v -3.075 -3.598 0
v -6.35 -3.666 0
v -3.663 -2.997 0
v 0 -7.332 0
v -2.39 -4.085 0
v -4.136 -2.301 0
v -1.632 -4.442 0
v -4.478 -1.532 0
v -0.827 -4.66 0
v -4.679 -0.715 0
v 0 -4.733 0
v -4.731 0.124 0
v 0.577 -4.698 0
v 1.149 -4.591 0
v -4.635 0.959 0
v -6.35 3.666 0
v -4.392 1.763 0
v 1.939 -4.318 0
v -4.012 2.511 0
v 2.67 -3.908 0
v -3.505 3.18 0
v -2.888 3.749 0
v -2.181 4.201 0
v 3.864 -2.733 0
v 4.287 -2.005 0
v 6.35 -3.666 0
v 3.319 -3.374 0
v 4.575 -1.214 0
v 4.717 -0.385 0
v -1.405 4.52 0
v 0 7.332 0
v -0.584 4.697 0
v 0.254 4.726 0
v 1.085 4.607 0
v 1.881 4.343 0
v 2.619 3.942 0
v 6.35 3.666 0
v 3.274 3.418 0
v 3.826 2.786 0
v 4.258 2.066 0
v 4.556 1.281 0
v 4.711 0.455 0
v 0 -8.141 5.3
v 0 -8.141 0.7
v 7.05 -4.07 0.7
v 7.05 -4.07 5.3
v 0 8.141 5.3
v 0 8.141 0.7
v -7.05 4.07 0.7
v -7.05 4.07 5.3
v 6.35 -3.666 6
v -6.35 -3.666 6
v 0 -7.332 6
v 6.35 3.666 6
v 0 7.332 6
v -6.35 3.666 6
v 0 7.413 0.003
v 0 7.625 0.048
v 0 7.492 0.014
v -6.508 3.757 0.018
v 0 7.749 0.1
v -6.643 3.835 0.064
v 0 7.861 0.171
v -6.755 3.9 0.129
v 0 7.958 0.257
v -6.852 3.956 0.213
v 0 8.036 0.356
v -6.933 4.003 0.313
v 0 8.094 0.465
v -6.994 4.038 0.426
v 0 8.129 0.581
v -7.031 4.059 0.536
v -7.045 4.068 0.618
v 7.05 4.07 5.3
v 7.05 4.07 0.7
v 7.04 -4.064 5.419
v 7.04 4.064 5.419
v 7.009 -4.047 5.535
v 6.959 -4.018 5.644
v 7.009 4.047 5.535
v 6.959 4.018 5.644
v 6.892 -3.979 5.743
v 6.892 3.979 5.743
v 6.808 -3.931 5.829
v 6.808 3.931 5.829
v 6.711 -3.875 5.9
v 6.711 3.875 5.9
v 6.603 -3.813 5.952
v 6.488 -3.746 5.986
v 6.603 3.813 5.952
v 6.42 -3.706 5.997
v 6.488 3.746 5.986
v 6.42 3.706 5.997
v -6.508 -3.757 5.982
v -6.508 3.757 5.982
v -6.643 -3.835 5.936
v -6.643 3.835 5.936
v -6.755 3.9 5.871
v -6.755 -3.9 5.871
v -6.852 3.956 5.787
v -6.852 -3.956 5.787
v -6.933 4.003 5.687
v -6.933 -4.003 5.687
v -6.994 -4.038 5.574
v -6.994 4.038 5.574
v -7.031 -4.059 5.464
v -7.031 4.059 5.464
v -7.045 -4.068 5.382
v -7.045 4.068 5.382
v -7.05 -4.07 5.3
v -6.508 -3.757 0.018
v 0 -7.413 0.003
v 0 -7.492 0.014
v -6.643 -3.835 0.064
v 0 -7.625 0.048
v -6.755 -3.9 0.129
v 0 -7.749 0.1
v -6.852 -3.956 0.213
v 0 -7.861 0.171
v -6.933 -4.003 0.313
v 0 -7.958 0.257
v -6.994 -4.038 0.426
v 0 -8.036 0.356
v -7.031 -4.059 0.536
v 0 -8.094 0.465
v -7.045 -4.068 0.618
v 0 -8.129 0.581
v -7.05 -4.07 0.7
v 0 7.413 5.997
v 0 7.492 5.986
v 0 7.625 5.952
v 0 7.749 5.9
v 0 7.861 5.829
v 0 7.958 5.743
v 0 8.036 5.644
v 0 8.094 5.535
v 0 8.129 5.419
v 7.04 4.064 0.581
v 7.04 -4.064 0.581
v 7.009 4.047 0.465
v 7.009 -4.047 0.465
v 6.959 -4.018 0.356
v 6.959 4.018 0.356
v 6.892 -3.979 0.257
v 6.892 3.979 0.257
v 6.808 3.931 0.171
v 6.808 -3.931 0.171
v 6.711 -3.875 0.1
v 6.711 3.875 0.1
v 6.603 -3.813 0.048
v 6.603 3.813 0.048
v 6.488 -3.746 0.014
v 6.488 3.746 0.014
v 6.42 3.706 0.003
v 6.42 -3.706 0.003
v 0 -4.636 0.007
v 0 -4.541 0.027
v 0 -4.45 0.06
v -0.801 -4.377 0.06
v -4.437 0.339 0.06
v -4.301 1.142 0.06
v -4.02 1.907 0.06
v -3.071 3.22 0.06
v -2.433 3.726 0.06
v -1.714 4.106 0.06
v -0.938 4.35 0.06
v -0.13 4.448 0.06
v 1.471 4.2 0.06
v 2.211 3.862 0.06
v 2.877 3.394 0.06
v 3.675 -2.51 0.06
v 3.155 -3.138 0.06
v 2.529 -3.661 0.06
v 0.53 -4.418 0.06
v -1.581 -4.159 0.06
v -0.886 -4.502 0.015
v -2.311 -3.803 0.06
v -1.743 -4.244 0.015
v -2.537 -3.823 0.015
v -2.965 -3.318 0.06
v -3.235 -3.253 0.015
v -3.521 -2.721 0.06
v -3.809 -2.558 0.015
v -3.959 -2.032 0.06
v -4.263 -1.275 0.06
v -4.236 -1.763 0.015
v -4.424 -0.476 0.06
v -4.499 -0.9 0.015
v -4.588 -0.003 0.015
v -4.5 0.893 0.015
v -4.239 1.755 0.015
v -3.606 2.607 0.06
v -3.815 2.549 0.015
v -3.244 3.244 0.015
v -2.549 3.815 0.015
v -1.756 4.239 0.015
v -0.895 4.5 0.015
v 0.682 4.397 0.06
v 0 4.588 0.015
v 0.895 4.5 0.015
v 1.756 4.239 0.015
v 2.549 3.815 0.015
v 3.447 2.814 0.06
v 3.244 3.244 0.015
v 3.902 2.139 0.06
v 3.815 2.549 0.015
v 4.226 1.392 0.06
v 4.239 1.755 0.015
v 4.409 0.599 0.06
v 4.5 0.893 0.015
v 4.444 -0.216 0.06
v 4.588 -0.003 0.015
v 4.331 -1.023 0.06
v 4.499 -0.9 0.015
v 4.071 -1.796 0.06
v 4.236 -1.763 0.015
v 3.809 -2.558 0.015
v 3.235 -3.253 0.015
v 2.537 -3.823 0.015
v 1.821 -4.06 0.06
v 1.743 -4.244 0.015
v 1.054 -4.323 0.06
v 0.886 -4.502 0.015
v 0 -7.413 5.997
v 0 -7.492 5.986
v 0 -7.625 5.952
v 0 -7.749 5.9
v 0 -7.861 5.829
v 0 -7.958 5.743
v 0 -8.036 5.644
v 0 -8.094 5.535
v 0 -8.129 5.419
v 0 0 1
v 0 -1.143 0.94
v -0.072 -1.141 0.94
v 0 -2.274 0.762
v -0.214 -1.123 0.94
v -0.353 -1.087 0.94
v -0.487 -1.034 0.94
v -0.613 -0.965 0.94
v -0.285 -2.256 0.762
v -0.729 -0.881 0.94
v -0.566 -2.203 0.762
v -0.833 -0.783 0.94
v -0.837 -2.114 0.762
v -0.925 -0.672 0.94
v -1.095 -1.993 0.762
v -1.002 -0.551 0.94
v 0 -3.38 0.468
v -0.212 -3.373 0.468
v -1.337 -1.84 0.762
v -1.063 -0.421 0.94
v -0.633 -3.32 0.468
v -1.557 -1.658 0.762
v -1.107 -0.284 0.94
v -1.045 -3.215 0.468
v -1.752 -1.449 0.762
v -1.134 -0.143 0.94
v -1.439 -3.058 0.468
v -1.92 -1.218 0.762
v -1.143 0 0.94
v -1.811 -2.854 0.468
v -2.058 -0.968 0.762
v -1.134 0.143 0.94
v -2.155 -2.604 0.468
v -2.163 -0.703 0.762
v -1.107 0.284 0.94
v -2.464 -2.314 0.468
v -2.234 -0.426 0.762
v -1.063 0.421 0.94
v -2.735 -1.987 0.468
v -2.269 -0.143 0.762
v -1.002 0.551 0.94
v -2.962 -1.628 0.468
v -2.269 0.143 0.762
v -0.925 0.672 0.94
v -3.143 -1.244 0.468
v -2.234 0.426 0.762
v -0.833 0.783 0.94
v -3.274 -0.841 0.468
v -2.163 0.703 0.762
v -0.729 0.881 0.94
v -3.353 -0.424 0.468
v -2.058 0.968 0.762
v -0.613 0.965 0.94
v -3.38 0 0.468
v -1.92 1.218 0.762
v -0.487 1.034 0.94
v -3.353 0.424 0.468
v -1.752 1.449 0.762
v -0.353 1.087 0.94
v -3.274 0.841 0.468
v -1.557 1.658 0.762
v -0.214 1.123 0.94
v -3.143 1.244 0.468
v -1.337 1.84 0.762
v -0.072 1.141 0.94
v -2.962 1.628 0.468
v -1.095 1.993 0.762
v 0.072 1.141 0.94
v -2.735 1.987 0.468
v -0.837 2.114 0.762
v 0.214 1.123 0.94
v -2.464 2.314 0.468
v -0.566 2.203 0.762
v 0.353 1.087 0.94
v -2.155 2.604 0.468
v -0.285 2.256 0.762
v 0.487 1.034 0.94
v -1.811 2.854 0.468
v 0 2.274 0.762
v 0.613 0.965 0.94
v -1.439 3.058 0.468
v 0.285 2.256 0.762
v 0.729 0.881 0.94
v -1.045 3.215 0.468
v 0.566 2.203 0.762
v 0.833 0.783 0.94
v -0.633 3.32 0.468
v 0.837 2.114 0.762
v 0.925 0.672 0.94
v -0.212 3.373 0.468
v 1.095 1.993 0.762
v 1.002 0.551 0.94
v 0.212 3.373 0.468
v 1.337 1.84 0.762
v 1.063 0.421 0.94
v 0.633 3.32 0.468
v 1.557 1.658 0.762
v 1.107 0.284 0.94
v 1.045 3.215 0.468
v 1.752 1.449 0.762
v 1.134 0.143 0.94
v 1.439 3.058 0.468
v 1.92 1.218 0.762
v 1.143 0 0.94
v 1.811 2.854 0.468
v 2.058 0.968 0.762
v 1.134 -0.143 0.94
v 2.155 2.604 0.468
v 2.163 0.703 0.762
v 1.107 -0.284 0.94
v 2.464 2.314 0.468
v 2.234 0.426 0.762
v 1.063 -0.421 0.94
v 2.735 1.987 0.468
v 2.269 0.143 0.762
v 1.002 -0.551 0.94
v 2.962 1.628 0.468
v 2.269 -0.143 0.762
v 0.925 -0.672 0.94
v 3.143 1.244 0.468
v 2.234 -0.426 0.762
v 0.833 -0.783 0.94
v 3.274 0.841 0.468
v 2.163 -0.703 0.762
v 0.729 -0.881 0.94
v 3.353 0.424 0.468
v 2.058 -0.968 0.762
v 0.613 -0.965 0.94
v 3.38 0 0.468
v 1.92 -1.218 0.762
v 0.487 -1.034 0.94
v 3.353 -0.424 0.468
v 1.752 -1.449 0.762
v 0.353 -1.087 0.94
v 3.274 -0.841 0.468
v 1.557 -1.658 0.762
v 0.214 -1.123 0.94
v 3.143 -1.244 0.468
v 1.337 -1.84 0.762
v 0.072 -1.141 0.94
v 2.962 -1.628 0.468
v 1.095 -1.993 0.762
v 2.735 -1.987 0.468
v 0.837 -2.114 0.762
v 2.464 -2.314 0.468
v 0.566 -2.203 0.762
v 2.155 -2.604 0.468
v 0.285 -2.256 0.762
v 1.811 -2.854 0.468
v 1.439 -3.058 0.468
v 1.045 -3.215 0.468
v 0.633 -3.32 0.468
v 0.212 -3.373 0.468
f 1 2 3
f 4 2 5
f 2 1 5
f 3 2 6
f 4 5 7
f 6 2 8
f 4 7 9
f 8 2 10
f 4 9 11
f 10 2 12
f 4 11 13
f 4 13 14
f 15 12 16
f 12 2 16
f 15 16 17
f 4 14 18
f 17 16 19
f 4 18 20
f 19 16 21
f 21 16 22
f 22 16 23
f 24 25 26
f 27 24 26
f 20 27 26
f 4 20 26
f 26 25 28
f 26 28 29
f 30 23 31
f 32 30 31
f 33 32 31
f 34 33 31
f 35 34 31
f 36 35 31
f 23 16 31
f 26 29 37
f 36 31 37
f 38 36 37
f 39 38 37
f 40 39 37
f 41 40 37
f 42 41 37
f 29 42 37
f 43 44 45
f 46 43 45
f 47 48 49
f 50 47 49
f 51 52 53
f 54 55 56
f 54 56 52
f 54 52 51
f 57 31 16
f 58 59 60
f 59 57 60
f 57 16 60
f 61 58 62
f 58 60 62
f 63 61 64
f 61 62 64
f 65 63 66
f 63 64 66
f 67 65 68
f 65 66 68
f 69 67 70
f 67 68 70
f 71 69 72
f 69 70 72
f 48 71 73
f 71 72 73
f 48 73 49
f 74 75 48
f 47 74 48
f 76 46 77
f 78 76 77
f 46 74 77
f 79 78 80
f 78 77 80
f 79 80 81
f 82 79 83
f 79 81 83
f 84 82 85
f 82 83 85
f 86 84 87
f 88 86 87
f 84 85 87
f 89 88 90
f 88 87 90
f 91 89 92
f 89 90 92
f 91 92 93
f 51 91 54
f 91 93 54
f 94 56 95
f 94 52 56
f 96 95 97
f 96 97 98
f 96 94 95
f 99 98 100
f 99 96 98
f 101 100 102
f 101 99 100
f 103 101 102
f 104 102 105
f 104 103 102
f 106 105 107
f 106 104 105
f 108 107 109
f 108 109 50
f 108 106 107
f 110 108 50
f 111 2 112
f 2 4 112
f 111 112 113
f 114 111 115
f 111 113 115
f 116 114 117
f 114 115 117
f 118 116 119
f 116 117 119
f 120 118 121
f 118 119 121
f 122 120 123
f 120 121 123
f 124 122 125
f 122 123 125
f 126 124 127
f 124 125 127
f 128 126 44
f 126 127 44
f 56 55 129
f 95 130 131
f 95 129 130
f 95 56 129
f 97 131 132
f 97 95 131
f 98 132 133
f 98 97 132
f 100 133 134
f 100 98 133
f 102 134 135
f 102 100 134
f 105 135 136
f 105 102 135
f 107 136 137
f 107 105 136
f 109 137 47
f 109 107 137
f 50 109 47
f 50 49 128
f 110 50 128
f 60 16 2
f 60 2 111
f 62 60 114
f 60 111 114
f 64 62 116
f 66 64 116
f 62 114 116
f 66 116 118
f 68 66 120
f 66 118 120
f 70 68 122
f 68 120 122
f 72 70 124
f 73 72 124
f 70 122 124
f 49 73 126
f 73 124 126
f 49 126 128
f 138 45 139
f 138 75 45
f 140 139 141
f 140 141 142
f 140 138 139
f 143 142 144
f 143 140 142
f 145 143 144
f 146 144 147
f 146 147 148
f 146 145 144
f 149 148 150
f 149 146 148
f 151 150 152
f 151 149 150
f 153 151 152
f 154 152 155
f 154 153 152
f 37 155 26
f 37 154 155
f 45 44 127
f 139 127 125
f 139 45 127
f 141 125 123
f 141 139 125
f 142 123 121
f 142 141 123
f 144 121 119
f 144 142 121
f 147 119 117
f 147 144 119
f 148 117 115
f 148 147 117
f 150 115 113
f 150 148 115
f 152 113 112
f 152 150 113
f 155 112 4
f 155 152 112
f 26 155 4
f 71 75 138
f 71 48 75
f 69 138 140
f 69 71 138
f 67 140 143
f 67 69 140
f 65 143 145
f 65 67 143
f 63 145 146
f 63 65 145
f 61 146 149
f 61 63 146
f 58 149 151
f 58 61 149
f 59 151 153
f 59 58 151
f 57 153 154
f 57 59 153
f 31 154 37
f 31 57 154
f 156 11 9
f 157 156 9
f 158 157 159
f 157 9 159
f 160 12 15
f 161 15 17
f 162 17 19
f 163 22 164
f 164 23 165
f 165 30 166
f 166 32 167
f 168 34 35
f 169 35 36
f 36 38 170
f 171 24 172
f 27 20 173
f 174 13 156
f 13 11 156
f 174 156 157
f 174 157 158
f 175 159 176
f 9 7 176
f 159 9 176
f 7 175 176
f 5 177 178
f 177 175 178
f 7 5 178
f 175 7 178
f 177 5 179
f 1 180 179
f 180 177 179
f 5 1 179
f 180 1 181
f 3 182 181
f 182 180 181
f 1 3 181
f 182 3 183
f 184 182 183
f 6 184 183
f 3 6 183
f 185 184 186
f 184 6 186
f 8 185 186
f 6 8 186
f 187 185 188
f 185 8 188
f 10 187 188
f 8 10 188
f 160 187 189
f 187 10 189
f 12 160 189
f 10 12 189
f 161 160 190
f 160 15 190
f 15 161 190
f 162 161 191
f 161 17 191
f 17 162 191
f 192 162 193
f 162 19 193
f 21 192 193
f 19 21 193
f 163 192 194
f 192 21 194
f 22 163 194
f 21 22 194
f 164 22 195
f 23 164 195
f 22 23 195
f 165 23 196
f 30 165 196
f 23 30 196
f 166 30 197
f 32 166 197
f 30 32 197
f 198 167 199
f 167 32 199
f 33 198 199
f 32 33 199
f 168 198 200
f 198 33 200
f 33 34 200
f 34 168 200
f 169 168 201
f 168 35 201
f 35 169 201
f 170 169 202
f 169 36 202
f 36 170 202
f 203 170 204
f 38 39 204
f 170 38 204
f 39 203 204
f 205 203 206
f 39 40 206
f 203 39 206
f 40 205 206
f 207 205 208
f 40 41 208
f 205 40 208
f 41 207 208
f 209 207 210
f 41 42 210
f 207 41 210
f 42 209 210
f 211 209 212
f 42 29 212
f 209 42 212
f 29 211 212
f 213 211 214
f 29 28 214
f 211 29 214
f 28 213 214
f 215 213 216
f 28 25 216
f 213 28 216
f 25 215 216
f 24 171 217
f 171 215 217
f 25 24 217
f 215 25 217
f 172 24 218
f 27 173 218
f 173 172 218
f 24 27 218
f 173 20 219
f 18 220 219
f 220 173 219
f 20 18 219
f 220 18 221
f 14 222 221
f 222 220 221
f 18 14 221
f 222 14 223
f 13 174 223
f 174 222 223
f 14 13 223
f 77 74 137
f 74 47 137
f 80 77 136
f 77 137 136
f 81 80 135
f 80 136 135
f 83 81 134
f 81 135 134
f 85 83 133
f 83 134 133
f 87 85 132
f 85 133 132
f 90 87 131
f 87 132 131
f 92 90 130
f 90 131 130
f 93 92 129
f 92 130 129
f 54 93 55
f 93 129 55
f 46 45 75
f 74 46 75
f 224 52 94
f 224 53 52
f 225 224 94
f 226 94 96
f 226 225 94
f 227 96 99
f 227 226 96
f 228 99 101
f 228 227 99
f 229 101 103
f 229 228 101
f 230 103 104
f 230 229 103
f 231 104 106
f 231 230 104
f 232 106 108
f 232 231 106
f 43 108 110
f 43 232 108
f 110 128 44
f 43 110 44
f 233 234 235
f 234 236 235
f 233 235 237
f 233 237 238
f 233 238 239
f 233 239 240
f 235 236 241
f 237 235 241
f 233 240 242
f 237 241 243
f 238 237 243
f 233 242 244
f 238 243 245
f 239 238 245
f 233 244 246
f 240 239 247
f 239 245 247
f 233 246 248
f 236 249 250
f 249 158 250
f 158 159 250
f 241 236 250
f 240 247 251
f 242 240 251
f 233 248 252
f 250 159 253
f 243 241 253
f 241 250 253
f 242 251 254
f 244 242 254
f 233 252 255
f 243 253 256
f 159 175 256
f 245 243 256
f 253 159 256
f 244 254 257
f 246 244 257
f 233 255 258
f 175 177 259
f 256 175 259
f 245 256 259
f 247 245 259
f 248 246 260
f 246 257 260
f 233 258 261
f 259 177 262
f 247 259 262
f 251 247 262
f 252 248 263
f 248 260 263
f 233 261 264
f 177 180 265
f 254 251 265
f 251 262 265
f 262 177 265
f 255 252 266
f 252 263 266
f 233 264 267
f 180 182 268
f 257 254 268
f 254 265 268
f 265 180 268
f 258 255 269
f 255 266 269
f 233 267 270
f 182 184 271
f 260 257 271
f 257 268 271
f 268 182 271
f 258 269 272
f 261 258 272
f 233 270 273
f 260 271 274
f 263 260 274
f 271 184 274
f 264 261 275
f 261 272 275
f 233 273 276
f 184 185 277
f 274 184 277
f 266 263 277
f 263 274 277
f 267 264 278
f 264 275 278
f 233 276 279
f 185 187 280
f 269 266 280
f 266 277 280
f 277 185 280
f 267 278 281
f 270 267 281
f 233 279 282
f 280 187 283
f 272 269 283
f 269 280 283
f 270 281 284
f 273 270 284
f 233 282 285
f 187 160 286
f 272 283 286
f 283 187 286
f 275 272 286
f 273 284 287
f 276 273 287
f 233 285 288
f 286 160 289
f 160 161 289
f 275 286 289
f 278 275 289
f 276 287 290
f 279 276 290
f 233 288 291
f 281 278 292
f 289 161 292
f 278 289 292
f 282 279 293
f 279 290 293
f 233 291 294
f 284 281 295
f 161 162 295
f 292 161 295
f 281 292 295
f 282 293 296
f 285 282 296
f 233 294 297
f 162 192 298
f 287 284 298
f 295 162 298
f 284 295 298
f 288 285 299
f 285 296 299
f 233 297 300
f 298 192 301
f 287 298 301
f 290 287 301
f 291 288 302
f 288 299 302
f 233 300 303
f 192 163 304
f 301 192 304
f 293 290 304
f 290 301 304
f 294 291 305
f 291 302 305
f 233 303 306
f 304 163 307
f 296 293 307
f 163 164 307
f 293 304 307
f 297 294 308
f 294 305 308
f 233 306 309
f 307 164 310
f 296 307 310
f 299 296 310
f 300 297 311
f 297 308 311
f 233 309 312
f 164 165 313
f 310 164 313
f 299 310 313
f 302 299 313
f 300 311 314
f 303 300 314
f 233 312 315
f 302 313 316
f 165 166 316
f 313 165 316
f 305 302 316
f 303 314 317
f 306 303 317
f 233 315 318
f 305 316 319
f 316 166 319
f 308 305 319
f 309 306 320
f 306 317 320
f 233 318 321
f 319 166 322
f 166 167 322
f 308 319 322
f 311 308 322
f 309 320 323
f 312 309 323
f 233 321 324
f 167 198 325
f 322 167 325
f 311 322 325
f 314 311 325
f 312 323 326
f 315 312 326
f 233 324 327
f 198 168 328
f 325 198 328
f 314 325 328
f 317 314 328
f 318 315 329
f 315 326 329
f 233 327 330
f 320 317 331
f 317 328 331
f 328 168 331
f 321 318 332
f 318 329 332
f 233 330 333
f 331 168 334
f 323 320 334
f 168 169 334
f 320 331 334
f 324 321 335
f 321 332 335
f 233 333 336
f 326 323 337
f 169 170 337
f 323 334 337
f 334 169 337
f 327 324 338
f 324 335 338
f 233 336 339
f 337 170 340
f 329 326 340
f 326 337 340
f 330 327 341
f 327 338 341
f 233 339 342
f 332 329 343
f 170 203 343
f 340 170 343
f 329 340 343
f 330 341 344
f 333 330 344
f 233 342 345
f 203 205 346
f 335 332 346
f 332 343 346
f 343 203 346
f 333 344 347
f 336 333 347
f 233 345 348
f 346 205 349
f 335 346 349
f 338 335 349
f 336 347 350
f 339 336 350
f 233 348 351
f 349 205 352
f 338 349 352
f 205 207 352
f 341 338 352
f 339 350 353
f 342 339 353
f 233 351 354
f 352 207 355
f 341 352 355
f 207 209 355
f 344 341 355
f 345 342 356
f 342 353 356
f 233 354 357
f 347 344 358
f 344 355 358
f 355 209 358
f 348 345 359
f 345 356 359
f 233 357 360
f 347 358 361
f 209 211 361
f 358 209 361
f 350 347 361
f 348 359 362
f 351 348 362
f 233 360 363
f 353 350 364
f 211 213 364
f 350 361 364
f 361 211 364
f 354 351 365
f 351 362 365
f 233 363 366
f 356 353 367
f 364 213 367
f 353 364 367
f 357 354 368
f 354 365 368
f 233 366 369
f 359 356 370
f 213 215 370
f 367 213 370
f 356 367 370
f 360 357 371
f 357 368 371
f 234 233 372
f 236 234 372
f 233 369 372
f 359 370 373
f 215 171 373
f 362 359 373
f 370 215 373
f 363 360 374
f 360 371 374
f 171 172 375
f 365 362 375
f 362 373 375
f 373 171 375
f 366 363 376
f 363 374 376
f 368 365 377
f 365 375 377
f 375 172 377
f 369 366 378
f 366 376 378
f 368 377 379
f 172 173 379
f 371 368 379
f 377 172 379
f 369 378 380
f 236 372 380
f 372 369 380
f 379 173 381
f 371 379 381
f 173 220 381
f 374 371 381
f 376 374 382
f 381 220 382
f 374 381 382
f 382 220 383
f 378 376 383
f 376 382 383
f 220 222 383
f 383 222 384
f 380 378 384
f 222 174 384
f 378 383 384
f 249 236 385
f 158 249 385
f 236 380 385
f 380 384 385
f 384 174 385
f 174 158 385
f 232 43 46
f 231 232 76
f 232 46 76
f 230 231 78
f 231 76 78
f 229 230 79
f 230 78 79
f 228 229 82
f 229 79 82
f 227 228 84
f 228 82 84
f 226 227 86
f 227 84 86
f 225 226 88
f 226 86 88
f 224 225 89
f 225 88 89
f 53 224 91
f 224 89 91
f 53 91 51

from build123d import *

# Parameters (mm, degrees)
F1_DEPTH = 6
F4_R     = 0.7


with BuildPart() as f1:
    # F0 (on Top) → F1 (new body)
    with BuildSketch(Plane.XY):
        Polygon((7.05, -4.0703193978), (7.05, 4.0703193978), (0, 8.1406387956), (-7.05, 4.0703193978), (-7.05, -4.0703193978), (0, -8.1406387956), align=None)
    extrude(amount=F1_DEPTH)

    # F2 (on Right) → F3 (revolve, cut)
    with BuildSketch(Plane.YZ):
        with BuildLine():
            Line((0, -10), (0, 0))
            Line((0, 0), (0, 1))
            ThreePointArc((0, 1), (-11, -10), (0, -21))
            Line((0, -21), (0, -10))
        make_face()
    revolve(axis=Axis((0, 0, -5), (0, 0, -1)), mode=Mode.SUBTRACT)

    # F4
    f4_edges = [f1.edges().sort_by_distance(p)[0] for p in [
        (3.525, -6.105479, 6),
        (7.05, 0, 6),
        (3.525, 6.105479, 6),
        (-3.525, 6.105479, 6),
        (-7.05, 0, 6),
        (-3.525, -6.105479, 6),
        (3.525, -6.105479, 0),
        (-3.525, -6.105479, 0),
        (7.05, 0, 0),
        (-7.05, 0, 0),
        (3.525, 6.105479, 0),
        (-3.525, 6.105479, 0),
        (0, 4.582576, 0),
    ]]
    fillet(f4_edges, radius=F4_R)


solid = f1.part
